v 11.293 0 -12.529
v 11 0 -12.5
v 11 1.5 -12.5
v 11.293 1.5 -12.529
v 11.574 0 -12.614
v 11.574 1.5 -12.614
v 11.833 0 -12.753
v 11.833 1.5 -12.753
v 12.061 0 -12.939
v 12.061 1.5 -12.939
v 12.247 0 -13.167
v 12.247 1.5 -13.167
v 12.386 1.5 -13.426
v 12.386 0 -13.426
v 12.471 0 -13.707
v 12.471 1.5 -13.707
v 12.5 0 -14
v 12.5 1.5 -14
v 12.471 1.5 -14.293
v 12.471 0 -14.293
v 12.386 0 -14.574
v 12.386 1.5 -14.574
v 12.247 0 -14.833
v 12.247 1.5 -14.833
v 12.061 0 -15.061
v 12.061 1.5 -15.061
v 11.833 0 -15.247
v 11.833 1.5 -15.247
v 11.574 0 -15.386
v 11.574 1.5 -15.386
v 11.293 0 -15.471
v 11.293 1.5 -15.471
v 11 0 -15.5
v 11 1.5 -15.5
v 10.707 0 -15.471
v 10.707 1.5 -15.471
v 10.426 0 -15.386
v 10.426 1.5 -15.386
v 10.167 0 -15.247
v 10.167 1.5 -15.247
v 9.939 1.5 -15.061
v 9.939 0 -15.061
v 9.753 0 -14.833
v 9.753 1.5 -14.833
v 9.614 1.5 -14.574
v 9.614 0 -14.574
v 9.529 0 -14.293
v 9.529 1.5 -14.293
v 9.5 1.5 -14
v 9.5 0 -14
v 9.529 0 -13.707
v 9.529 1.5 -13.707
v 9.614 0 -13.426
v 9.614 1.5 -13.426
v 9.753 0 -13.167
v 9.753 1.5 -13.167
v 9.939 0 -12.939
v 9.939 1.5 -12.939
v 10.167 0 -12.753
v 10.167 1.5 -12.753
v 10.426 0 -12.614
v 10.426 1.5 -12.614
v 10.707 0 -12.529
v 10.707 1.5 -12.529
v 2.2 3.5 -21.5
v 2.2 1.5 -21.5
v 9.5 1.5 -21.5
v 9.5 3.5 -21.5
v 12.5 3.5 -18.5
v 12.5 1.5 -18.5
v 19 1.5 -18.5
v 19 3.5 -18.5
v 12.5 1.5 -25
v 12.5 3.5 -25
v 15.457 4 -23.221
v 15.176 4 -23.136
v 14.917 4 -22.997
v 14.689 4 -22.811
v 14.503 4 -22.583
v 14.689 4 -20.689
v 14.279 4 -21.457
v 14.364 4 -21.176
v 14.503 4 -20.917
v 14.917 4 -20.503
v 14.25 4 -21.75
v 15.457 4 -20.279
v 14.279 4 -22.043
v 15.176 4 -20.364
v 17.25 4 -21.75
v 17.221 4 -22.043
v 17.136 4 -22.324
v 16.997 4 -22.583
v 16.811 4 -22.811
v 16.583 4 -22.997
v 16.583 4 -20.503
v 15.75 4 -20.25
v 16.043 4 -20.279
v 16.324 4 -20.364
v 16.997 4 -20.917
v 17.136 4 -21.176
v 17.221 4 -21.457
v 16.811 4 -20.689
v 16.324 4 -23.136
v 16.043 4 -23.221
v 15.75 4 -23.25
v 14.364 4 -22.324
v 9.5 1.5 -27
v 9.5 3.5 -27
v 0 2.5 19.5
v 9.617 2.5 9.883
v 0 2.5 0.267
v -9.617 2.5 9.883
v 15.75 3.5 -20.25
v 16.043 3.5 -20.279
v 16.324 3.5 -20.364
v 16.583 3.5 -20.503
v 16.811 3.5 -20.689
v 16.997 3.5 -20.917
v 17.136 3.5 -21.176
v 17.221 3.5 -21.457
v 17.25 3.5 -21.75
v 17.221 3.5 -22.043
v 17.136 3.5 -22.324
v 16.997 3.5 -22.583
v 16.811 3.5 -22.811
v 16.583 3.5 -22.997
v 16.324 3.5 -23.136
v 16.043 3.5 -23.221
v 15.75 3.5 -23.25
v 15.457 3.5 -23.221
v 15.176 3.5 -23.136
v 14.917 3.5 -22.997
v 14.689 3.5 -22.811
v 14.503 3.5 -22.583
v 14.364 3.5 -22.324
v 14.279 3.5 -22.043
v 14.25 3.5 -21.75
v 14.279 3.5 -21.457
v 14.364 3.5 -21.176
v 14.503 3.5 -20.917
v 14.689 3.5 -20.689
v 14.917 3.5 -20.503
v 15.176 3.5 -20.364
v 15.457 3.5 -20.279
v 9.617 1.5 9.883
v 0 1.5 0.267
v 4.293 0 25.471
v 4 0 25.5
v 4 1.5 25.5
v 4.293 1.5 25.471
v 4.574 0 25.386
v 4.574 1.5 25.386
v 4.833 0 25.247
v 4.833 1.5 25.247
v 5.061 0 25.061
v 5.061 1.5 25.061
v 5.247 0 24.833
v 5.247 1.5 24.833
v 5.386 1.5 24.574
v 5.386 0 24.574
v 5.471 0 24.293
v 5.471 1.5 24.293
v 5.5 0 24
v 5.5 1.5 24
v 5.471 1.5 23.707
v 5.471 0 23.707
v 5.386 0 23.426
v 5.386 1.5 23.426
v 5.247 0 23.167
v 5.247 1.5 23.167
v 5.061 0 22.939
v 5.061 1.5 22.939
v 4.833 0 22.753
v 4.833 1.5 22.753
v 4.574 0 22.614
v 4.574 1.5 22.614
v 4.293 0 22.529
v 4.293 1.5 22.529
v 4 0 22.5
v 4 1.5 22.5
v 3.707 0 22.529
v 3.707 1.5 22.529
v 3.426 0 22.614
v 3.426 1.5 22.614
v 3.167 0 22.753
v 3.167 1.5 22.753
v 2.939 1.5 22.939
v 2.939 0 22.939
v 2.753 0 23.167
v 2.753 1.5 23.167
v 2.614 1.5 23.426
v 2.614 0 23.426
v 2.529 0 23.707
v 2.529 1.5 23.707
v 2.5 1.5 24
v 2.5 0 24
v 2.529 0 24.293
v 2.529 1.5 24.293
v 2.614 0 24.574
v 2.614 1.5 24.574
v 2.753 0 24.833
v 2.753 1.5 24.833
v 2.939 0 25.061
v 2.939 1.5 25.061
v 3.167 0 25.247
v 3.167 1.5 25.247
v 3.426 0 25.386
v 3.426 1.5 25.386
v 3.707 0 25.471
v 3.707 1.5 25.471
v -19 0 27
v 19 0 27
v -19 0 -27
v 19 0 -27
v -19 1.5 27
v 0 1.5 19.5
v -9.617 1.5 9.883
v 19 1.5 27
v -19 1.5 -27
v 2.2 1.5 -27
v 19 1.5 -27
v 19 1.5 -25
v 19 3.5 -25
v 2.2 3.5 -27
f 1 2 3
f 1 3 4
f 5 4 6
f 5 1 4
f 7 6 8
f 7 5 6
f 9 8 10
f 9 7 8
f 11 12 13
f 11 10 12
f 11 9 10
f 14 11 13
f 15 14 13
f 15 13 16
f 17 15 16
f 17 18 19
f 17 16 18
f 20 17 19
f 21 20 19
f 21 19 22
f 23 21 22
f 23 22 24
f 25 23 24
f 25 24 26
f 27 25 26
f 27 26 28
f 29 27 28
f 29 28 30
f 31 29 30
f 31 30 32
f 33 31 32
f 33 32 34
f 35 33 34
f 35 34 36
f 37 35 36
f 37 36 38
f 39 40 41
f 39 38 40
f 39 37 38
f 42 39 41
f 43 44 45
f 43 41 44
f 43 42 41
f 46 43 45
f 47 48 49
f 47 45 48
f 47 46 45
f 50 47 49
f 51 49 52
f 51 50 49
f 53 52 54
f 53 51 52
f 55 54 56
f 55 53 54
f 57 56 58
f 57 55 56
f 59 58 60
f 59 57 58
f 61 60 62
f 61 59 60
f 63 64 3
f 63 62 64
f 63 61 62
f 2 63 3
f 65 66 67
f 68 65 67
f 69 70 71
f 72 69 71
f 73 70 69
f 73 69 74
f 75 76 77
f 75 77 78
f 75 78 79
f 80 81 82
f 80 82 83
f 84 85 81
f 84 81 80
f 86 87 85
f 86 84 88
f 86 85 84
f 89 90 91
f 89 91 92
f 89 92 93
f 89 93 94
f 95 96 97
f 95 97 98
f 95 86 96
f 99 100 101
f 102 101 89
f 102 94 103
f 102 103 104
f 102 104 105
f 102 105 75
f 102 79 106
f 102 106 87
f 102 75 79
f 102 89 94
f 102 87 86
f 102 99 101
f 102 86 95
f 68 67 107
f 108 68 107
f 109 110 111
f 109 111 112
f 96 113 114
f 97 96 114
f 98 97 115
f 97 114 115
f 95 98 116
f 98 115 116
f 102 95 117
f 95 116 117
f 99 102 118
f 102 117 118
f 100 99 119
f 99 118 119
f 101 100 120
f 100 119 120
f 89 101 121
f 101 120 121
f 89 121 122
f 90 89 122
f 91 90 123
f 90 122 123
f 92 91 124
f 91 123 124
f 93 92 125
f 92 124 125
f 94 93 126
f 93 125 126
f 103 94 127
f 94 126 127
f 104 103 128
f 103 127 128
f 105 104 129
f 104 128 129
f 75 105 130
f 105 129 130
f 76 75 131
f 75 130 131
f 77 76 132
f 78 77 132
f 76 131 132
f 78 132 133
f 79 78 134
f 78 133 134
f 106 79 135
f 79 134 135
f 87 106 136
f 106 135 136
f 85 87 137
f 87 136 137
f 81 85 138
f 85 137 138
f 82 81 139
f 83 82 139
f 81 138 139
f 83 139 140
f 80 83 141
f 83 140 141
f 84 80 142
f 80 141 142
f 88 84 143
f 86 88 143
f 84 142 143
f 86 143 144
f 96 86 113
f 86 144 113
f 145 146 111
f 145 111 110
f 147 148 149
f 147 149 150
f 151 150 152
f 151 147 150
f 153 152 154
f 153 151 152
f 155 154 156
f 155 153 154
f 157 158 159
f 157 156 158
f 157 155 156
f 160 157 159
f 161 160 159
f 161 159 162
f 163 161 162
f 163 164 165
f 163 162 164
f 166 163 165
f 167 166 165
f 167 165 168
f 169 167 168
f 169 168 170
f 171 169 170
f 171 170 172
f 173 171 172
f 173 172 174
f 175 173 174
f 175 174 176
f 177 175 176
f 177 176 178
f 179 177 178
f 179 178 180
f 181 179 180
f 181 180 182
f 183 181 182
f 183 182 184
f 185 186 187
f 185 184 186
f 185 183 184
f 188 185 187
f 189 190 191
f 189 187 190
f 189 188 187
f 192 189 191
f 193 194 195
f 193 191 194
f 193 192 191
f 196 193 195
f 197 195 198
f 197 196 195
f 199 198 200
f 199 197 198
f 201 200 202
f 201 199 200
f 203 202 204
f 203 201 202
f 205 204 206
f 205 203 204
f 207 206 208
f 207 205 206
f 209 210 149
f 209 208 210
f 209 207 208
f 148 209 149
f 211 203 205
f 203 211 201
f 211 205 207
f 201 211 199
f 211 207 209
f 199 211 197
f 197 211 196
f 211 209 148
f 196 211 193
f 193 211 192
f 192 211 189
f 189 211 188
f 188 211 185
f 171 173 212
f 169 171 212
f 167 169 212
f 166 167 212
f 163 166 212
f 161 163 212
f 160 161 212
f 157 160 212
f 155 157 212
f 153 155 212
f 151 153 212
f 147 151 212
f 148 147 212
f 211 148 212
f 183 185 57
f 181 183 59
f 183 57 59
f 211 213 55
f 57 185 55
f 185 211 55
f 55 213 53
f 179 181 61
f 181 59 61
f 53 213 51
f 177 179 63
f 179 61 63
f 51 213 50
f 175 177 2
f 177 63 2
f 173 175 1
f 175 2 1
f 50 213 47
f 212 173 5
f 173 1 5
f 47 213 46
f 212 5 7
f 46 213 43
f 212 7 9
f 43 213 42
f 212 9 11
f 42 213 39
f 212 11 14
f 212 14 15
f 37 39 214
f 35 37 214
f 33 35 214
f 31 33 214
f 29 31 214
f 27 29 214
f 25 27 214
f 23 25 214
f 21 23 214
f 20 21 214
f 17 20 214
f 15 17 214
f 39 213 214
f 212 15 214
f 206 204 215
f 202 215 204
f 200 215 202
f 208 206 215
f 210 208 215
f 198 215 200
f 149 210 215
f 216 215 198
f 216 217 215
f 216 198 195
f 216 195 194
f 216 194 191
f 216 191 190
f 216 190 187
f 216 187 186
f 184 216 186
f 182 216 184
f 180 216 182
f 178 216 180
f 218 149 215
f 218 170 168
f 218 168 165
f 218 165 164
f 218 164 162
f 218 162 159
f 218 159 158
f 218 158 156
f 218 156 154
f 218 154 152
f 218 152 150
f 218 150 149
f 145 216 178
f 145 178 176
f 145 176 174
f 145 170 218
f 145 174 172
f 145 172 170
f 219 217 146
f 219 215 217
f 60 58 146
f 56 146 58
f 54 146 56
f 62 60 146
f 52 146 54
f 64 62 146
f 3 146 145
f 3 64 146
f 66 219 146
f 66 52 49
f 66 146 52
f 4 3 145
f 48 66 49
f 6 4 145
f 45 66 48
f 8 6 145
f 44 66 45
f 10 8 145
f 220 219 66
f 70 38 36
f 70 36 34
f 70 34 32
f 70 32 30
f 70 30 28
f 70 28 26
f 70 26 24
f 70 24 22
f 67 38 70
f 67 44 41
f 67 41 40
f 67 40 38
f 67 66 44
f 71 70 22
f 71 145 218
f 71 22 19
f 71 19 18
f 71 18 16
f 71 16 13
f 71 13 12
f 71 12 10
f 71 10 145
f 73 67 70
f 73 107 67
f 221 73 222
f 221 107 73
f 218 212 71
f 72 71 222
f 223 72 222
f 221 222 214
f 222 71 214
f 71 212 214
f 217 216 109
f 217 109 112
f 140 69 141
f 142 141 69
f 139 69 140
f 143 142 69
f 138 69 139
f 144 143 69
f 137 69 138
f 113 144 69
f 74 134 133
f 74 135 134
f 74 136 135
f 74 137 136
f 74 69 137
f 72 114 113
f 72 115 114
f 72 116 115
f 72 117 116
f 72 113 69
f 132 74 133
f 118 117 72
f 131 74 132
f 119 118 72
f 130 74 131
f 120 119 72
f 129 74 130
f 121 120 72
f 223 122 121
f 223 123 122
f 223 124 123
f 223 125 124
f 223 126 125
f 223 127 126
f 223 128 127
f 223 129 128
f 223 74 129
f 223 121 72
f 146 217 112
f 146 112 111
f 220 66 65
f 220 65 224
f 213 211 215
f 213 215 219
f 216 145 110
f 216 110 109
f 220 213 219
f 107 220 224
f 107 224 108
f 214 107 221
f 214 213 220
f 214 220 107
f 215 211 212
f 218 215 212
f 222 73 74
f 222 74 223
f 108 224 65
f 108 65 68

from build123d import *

# Parameters (mm, degrees)
SKETCH1_W               = 38
SKETCH1_H               = 54
PCB_DEPTH               = 1.5
ATMEGA_DEPTH            = 1
SKETCH3_W               = 7.3
SKETCH3_H               = 5.5
SKETCH3_W_2             = 6.5
SKETCH3_H_2             = 6.5
USB_AND_RST_DEPTH       = 2
SKETCH4_R               = 1.5
BUTTON_DEPTH            = 0.5
CUT_EXTRUDE1_DEPTH      = 34.109666262
CUT_EXTRUDE1_DEPTH_BACK = 34.109666262
SKETCH5_R               = 1.5


with BuildPart() as part:
    # Sketch1 → PCB (new body)
    with BuildSketch(Plane(origin=(0, 0, 0), x_dir=(1, 0, 0), z_dir=(0, 1, 0))):
        Rectangle(SKETCH1_W, SKETCH1_H)
    extrude(amount=PCB_DEPTH)

    # Sketch2 → ATMega (add)
    with BuildSketch(Plane(origin=(0, 1.5, 0), x_dir=(1, 0, 0), z_dir=(0, 1, 0))):
        Polygon((0, -0.266695552), (9.616652224, -9.883347776), (0, -19.5), (-9.616652224, -9.883347776), align=None)
    extrude(amount=ATMEGA_DEPTH)

    # Sketch3 → USB and RST (add)
    with BuildSketch(Plane(origin=(0, 1.5, 0), x_dir=(1, 0, 0), z_dir=(0, 1, 0))):
        with Locations((5.85, 24.25)):
            Rectangle(SKETCH3_W, SKETCH3_H)
        with Locations((15.75, 21.75)):
            Rectangle(SKETCH3_W_2, SKETCH3_H_2)
    extrude(amount=USB_AND_RST_DEPTH)

    # Sketch4 → Button (add)
    with BuildSketch(Plane(origin=(0, 3.5, 0), x_dir=(1, 0, 0), z_dir=(0, 1, 0))):
        with Locations(Location((15.75, 21.75, 0), (0, 0, 270))):
            Circle(SKETCH4_R)
    extrude(amount=BUTTON_DEPTH)

    # Sketch5 → Cut-Extrude1 (cut, two sides: drawn at the far end of the back side and taken through both)
    with BuildSketch(Plane(origin=(0, 1.5, 0), x_dir=(1, 0, 0), z_dir=(0, 1, 0)).offset(-CUT_EXTRUDE1_DEPTH_BACK)):
        with Locations(Location((11, 14, 0), (0, 0, 270))):
            Circle(SKETCH5_R)
        with Locations(Location((4, -24, 0), (0, 0, 270))):
            Circle(SKETCH5_R)
    extrude(amount=CUT_EXTRUDE1_DEPTH + CUT_EXTRUDE1_DEPTH_BACK, mode=Mode.SUBTRACT)


solid = part.part
